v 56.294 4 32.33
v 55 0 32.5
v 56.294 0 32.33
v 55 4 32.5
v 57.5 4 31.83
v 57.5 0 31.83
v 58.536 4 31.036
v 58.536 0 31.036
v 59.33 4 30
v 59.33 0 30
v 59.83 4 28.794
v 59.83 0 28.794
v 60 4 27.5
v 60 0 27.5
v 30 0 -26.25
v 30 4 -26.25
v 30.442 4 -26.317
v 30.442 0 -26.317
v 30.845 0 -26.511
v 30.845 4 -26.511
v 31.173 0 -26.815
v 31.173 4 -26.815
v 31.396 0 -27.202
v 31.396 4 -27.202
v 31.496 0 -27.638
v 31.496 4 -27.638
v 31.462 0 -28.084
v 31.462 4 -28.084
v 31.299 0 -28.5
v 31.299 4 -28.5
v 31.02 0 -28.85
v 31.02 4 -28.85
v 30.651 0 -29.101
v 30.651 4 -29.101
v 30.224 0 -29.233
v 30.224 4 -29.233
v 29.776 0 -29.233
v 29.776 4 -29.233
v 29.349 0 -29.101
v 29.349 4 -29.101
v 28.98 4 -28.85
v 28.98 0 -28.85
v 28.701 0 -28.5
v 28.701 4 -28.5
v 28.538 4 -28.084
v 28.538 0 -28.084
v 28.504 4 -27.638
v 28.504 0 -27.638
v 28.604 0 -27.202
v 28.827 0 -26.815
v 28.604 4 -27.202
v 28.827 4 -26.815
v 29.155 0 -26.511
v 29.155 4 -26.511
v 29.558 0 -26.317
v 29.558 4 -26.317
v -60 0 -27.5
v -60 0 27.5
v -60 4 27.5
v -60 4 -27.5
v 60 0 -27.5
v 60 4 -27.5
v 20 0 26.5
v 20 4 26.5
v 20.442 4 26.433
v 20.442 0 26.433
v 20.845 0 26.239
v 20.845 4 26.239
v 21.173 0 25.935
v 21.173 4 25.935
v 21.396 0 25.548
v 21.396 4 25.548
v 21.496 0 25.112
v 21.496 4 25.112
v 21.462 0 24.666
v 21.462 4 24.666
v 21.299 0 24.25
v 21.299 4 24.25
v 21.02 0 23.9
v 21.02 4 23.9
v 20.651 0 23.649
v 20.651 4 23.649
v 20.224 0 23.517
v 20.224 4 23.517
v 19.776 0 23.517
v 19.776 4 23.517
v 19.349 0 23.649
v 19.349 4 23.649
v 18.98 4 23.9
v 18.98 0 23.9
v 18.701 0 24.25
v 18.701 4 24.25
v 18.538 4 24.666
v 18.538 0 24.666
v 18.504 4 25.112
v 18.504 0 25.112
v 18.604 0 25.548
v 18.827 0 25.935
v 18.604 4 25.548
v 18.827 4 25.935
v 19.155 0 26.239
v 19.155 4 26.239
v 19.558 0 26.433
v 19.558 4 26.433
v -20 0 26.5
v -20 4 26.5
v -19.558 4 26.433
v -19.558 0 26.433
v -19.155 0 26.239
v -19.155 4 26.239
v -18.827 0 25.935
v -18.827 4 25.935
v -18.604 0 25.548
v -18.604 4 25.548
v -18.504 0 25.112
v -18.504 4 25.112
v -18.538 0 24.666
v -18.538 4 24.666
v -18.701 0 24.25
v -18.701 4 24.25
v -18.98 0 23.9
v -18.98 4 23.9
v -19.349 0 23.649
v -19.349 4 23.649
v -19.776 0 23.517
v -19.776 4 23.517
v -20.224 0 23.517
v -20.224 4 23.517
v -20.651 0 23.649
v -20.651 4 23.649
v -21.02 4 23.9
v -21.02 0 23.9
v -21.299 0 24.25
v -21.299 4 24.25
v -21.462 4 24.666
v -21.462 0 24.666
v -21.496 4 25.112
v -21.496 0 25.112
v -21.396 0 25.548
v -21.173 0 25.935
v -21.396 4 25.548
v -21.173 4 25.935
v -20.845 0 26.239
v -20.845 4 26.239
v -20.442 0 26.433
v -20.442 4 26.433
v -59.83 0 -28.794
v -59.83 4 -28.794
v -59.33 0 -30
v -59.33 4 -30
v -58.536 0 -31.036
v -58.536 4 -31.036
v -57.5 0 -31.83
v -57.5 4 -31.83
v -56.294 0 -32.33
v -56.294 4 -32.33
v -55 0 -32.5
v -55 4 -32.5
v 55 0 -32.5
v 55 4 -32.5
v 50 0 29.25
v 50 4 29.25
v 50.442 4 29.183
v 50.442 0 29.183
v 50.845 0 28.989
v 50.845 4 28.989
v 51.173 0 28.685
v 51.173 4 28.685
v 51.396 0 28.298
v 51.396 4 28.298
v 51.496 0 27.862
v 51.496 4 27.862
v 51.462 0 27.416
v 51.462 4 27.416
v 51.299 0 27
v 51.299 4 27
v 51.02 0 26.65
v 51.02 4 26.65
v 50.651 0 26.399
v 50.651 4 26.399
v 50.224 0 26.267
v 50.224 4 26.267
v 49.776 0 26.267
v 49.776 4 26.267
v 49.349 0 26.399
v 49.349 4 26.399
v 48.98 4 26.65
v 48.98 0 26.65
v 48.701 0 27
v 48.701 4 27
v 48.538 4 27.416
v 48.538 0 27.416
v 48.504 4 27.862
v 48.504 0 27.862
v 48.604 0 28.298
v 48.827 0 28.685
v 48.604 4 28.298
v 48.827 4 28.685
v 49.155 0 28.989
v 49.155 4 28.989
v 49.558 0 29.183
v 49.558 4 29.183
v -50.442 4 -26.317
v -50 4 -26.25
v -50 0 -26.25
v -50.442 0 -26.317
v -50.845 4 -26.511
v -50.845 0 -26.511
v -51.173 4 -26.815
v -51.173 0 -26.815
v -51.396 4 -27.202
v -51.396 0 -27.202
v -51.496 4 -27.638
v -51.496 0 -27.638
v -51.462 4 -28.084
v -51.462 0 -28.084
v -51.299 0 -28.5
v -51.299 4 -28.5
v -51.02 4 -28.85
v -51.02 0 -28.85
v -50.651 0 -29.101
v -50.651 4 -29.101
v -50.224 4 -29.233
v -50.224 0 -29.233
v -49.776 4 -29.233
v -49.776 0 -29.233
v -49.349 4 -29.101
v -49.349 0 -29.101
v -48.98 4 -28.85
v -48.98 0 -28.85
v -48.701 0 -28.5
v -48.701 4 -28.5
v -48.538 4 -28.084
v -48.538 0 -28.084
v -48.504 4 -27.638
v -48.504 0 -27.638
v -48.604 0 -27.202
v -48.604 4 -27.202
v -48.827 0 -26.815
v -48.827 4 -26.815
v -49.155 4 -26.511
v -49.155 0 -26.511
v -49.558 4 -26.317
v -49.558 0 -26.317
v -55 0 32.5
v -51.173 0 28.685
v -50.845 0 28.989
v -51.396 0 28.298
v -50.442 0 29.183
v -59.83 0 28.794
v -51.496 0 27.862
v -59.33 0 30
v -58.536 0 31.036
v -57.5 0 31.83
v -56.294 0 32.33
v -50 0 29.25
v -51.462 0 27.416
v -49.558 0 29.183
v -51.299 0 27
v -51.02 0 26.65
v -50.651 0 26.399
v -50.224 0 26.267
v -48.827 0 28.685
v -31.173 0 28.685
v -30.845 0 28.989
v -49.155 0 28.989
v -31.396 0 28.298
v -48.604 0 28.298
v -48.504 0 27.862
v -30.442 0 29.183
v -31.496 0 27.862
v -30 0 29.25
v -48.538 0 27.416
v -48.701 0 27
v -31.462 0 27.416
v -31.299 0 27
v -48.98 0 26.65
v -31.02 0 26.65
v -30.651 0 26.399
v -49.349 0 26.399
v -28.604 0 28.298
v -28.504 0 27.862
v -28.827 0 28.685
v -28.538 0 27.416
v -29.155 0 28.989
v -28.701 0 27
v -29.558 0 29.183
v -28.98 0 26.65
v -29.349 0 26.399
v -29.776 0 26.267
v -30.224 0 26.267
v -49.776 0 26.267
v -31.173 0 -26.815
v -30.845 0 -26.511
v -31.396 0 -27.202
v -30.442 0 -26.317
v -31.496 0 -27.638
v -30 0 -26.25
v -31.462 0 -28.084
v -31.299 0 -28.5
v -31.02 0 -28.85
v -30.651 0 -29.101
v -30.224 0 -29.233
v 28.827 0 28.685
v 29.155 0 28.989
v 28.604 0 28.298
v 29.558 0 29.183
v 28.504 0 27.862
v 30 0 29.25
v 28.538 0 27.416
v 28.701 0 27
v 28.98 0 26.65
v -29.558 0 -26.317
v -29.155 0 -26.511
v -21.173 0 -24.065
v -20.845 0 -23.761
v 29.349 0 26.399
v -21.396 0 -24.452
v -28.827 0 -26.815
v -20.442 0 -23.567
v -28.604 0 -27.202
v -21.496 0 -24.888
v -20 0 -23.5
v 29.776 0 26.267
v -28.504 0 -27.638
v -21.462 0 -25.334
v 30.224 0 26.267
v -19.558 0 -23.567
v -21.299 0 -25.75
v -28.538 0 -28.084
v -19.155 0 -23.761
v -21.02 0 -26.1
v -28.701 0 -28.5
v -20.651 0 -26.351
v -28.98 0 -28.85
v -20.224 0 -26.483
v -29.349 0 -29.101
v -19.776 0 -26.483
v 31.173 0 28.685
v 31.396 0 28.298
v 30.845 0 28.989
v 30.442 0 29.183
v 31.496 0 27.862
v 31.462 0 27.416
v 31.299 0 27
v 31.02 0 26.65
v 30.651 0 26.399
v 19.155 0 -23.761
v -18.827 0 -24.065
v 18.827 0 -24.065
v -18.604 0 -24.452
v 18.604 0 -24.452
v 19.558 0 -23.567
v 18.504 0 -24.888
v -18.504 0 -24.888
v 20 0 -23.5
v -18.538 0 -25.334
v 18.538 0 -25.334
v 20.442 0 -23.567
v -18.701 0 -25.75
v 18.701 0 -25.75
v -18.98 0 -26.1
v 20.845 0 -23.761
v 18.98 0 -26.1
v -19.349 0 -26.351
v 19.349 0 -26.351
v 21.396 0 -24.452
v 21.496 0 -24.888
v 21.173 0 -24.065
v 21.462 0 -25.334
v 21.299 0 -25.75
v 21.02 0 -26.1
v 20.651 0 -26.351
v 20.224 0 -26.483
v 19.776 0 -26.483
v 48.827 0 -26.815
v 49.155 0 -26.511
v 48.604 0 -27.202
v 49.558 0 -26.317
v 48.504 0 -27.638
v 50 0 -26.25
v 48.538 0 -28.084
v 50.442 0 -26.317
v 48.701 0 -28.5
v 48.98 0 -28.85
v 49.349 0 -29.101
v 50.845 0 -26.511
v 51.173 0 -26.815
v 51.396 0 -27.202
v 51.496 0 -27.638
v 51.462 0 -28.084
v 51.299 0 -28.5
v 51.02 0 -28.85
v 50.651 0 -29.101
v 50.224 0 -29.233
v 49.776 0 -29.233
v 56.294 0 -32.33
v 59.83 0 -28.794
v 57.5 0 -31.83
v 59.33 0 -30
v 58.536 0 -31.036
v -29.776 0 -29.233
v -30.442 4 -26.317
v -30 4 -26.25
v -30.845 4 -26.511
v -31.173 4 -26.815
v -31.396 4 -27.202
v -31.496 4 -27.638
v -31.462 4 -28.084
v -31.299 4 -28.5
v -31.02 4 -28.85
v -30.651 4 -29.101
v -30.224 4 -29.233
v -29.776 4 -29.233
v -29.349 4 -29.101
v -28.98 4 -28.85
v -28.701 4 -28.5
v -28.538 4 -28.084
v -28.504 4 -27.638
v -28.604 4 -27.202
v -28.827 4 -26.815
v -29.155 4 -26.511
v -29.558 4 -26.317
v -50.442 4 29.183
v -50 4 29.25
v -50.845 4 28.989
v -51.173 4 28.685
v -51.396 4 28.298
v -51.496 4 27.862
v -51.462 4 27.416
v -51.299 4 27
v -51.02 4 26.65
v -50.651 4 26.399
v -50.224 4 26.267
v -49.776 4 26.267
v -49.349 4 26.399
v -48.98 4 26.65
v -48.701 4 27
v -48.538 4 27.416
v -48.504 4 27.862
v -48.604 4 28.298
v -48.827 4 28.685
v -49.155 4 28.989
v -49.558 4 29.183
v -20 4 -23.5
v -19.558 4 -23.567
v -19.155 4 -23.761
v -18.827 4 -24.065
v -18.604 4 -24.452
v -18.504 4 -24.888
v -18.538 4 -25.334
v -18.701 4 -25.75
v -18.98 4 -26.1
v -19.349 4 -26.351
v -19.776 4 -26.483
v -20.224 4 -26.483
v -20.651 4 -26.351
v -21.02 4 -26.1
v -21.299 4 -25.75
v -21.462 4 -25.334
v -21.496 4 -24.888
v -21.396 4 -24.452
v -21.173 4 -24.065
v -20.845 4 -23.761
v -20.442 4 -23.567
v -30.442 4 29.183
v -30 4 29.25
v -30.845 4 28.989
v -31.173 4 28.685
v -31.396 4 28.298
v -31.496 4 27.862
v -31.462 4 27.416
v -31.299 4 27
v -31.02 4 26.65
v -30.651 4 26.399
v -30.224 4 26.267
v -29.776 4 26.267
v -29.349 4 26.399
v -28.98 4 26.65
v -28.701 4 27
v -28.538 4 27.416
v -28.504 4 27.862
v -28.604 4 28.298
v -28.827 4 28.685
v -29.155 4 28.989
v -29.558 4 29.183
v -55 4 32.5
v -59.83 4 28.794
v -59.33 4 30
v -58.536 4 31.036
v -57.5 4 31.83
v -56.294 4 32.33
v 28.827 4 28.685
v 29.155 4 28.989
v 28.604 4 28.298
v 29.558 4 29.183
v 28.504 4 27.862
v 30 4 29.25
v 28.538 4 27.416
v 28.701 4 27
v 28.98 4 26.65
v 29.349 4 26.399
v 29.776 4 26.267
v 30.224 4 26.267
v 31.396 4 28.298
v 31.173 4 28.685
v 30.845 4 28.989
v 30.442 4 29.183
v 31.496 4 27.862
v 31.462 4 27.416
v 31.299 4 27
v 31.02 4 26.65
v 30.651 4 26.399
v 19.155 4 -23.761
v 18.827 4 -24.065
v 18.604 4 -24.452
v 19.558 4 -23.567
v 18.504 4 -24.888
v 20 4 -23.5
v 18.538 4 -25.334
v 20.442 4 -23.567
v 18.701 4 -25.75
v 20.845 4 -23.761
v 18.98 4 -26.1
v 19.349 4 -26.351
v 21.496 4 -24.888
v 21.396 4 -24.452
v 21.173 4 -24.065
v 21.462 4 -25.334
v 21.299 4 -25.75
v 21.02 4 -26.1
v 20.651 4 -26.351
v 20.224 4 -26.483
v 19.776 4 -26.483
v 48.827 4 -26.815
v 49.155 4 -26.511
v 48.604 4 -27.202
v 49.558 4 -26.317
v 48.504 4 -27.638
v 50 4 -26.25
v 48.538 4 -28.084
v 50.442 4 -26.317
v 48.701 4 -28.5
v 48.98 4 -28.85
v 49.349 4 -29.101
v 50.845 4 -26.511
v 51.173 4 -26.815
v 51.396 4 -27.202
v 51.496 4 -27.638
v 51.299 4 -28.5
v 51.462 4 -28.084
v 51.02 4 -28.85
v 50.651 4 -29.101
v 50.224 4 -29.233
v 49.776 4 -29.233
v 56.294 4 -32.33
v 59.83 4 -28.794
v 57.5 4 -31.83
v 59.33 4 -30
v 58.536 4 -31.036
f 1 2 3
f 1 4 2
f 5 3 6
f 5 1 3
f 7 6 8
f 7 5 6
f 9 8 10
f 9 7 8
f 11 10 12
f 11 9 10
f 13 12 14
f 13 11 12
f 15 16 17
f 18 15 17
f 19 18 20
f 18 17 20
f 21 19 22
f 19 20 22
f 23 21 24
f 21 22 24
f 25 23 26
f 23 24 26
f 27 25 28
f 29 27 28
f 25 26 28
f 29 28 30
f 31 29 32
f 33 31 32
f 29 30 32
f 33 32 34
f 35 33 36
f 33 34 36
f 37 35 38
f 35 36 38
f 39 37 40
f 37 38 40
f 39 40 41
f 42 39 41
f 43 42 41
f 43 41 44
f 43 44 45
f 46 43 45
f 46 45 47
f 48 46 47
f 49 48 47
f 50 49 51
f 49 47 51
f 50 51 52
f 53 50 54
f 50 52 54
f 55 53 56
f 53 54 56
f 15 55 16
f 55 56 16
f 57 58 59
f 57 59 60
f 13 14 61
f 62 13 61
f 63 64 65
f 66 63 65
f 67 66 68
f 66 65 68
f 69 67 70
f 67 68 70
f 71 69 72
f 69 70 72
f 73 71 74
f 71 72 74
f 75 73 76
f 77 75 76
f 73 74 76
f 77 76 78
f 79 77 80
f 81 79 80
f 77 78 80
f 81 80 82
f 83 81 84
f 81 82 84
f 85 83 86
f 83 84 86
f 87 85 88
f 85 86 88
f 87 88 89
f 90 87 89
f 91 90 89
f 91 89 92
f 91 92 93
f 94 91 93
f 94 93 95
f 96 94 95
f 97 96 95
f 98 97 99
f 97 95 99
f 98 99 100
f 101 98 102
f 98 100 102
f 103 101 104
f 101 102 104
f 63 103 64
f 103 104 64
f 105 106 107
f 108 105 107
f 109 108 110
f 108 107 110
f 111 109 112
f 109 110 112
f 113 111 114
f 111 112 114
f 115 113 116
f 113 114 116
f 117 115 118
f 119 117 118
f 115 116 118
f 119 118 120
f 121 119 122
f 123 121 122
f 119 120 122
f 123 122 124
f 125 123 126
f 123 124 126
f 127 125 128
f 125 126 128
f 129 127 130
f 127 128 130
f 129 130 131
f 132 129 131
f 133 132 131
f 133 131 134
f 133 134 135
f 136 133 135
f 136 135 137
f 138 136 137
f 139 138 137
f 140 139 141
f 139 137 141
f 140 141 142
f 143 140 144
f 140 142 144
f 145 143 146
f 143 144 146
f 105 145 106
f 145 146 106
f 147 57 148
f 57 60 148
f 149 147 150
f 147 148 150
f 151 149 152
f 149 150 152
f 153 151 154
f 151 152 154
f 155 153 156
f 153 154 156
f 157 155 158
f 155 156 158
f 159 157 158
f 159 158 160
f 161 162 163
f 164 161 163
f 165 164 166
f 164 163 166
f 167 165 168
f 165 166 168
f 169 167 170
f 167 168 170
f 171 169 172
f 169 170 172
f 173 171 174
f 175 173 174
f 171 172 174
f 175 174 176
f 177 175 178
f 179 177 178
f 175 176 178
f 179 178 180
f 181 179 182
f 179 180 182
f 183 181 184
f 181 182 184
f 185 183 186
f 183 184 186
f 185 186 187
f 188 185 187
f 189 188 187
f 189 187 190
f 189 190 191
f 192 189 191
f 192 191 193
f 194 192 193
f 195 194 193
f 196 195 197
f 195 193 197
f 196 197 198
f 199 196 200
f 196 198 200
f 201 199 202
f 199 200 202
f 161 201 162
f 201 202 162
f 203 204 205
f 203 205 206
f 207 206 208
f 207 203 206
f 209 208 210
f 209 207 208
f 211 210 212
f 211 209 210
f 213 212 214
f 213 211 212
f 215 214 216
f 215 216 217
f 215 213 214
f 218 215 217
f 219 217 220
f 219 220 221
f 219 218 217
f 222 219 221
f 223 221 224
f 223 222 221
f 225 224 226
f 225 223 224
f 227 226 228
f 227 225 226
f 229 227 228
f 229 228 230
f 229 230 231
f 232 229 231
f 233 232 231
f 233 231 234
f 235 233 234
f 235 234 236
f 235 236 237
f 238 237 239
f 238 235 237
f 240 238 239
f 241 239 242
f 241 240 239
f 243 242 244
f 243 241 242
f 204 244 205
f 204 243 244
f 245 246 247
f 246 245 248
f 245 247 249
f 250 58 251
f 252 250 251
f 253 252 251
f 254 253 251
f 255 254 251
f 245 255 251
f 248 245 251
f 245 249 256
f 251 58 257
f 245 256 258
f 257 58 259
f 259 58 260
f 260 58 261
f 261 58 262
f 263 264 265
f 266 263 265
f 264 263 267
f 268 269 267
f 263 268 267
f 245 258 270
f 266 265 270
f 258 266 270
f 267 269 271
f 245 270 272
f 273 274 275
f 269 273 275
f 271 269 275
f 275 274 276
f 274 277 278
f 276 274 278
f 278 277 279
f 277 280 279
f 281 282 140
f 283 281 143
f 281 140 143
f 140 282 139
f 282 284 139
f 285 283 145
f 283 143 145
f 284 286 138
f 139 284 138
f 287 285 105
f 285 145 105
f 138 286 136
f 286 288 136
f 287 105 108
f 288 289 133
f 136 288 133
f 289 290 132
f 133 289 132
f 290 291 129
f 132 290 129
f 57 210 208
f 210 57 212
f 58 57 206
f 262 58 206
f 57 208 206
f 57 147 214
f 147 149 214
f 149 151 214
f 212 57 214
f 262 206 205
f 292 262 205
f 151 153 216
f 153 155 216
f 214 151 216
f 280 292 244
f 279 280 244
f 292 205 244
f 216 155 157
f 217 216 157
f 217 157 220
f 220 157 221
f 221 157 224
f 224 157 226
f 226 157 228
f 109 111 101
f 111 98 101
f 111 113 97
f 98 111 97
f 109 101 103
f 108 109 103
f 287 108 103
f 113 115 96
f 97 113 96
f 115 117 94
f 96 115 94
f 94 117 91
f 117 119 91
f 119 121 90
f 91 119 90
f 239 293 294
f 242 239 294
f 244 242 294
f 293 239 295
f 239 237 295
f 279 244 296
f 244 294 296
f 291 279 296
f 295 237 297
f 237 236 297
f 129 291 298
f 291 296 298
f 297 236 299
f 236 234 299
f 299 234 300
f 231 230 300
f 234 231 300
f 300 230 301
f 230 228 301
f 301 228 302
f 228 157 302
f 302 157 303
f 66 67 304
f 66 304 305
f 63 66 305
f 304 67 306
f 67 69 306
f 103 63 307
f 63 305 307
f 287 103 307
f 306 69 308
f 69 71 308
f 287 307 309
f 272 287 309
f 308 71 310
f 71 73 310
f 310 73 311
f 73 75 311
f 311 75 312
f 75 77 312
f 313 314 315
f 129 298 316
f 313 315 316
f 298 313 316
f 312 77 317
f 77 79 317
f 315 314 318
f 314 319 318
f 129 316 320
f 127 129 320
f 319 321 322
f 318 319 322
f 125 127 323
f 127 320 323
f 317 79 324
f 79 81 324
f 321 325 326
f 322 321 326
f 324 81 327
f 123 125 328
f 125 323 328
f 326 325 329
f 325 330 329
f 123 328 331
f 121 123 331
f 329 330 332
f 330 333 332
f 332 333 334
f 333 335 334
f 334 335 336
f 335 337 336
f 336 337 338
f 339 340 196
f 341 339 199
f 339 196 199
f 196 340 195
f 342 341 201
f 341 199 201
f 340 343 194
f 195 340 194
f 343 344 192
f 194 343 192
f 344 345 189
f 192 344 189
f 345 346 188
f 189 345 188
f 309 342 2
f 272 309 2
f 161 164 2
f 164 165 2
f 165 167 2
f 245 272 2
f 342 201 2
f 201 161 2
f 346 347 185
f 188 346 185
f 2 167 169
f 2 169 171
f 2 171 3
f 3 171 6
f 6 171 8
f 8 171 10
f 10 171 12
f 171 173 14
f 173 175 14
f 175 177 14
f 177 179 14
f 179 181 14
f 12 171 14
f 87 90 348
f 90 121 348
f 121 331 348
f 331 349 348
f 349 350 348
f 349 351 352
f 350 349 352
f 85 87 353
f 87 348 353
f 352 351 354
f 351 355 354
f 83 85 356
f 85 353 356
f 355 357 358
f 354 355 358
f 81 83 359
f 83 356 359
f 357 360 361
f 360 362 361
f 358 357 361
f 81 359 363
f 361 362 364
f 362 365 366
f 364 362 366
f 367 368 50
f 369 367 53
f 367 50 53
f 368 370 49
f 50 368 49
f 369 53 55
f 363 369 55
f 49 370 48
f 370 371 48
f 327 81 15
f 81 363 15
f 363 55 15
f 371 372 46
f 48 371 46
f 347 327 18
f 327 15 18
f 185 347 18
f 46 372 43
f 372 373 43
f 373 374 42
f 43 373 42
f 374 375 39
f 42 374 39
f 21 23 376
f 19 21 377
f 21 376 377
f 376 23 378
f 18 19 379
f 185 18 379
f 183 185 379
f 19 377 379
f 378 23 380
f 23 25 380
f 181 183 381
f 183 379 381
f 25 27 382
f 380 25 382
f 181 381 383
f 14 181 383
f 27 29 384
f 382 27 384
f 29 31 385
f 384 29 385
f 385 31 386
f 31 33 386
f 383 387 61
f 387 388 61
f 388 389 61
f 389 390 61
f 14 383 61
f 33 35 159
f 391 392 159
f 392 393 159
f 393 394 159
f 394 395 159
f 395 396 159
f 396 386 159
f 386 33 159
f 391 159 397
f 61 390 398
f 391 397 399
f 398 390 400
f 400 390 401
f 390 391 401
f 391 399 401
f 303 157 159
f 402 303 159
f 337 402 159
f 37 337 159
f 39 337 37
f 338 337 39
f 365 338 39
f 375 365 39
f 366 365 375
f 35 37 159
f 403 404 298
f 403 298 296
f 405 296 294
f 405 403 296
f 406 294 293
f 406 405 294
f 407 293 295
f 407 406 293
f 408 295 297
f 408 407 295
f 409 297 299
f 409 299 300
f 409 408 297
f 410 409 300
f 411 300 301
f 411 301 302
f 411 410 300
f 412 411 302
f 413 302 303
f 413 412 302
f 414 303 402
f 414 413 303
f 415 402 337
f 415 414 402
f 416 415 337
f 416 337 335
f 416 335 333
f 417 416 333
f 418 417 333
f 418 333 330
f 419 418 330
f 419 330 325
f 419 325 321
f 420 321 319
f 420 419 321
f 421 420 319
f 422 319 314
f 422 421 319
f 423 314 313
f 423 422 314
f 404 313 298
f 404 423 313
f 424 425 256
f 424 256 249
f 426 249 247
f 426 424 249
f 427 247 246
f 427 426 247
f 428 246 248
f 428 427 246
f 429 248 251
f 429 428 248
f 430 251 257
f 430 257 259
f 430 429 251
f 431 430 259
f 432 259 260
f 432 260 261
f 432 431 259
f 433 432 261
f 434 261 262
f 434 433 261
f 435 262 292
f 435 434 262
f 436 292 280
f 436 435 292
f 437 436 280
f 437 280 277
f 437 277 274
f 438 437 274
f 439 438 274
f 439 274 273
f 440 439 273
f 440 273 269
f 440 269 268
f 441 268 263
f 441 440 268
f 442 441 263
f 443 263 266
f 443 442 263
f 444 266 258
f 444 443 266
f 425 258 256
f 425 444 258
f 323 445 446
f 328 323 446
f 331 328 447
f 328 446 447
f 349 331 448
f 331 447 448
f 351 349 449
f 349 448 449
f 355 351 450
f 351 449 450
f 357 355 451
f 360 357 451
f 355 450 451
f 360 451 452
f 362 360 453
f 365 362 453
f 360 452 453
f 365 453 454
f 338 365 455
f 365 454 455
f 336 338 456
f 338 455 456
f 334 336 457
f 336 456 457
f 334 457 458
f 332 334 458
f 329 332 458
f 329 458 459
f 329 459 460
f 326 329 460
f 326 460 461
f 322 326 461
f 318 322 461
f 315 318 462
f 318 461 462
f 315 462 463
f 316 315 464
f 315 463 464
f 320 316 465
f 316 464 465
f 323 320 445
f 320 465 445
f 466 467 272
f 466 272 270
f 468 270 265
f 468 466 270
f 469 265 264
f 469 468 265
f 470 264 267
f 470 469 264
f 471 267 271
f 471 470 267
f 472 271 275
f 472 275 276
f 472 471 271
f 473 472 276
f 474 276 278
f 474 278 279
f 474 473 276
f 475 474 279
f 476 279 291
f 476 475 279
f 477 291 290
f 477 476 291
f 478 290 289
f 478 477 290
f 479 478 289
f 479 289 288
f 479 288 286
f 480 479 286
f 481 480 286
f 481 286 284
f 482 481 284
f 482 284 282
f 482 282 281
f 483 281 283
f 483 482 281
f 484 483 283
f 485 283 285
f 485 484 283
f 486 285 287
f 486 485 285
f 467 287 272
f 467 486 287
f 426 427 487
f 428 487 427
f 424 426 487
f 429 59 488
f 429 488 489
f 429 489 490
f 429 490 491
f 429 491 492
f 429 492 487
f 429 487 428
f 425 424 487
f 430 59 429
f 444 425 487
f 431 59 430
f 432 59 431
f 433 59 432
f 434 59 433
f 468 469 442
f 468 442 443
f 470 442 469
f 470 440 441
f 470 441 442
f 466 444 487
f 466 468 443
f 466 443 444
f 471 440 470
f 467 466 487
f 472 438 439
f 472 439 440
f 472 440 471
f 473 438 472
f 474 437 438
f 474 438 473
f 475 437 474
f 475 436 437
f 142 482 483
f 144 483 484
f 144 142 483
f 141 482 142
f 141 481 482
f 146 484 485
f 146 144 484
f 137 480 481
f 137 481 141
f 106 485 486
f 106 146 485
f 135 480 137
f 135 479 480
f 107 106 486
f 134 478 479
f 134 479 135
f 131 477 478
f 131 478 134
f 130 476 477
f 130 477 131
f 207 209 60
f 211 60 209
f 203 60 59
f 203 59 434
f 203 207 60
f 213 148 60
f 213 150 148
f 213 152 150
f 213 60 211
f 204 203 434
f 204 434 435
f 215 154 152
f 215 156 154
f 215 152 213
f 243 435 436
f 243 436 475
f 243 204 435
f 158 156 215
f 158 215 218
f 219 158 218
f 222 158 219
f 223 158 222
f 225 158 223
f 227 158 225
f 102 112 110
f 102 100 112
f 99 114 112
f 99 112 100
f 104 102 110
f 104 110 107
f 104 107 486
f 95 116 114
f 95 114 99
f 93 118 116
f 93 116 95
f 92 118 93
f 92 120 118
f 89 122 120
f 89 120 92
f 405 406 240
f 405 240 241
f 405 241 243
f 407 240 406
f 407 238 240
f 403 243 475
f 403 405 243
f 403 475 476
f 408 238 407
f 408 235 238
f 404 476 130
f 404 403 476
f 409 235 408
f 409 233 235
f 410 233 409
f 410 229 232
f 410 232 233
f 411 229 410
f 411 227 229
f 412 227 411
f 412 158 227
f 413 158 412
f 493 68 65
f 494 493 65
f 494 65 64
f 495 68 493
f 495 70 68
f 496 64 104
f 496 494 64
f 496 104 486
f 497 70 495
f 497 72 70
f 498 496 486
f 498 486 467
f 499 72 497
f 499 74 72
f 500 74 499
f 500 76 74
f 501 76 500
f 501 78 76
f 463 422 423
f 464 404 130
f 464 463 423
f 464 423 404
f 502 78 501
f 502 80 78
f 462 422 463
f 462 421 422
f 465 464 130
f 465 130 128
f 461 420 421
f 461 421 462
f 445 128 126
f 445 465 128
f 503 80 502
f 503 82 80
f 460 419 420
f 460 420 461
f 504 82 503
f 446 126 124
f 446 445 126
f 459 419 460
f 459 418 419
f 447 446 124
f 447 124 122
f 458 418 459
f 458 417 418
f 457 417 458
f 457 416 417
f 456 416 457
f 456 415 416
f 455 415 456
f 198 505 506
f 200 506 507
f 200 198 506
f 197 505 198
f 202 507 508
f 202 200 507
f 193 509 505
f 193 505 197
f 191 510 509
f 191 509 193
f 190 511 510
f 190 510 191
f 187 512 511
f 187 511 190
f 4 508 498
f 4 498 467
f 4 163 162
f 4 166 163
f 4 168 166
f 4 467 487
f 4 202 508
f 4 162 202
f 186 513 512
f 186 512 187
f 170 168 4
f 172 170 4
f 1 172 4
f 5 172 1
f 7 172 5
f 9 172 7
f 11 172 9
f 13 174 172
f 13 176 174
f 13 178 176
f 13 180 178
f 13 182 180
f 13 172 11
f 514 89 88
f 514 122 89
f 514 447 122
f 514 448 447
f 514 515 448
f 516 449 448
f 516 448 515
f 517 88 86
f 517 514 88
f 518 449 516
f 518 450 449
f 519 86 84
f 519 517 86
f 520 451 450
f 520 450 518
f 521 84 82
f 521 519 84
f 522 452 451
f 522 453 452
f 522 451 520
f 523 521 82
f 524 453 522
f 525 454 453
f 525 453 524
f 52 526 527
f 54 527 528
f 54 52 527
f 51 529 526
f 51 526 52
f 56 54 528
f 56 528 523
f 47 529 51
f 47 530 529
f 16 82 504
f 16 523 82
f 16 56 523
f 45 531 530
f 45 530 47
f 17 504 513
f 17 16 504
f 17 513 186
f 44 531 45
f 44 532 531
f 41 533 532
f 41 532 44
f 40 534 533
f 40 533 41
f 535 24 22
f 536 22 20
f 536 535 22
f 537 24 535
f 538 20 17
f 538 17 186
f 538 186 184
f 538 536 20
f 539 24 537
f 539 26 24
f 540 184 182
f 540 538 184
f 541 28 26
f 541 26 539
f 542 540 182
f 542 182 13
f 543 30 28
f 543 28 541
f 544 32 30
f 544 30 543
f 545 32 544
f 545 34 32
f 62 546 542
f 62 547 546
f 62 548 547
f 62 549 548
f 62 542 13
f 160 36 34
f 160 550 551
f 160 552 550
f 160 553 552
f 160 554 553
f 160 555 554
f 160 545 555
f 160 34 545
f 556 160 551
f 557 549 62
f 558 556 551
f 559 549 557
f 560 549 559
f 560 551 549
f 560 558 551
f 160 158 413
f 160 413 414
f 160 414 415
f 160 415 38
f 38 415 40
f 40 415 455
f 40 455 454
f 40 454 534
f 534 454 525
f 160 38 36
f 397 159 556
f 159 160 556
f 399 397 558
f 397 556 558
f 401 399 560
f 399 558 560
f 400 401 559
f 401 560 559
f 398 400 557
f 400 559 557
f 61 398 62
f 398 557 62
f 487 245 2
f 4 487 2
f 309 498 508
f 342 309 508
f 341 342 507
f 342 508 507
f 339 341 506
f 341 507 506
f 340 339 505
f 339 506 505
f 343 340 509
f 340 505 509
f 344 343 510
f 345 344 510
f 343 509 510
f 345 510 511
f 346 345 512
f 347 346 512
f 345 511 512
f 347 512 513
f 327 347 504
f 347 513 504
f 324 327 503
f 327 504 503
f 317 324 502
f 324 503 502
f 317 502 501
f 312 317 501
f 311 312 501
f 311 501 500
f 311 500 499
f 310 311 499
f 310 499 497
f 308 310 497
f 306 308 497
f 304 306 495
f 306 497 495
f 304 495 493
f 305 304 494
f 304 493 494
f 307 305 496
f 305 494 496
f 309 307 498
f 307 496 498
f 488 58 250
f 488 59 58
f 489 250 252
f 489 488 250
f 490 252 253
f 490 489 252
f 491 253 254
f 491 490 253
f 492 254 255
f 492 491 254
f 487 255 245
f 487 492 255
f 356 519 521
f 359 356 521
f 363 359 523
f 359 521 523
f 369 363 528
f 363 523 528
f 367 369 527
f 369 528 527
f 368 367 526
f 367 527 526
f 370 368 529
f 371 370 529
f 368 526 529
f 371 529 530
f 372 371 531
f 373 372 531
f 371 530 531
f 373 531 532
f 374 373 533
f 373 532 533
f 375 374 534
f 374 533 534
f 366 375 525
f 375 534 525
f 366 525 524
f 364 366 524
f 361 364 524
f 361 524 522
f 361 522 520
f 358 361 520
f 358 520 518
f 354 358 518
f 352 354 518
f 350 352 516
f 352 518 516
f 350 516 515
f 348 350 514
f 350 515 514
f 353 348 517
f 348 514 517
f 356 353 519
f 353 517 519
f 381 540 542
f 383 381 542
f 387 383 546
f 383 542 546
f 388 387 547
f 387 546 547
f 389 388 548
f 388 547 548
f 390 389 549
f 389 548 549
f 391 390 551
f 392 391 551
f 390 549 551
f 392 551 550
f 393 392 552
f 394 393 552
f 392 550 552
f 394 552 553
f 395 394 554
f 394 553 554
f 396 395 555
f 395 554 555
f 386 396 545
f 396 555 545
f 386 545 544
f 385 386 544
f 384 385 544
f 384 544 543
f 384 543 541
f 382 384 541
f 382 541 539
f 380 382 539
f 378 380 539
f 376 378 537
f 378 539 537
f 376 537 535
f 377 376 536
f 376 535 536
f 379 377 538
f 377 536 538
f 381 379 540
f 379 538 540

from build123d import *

# Parameters (mm, degrees)
SKETCH_1_W          = 120
SKETCH_1_H          = 65
EXTRUDE_1_DEPTH     = 4
SKETCH_2_R          = 1.5
CUT_EXTRUDE_1_DEPTH = 4
FILLET_1_R          = 5
SKETCH_3_R          = 1.5
CUT_EXTRUDE_2_DEPTH = 4


with BuildPart() as part:
    # 草图1 → 凸台-拉伸1 (new body)
    with BuildSketch(Plane(origin=(0, 0, 0), x_dir=(1, 0, 0), z_dir=(0, 1, 0))):
        Rectangle(SKETCH_1_W, SKETCH_1_H)
    extrude(amount=EXTRUDE_1_DEPTH)

    # 草图2 → 切除-拉伸1 (cut)
    with BuildSketch(Plane(origin=(0, 4, 0), x_dir=(1, 0, 0), z_dir=(0, 1, 0))):
        with Locations(Location((50, -27.75, 0), (0, 0, 270))):
            Circle(SKETCH_2_R)
        with Locations(Location((50, 27.75, 0), (0, 0, 270))):
            Circle(SKETCH_2_R)
        with Locations(Location((30, 27.75, 0), (0, 0, 270))):
            Circle(SKETCH_2_R)
        with Locations(Location((30, -27.75, 0), (0, 0, 270))):
            Circle(SKETCH_2_R)
    cut_extrude_1 = extrude(amount=-CUT_EXTRUDE_1_DEPTH, mode=Mode.SUBTRACT)

    # 镜向2: 切除-拉伸1 across plane
    add(cut_extrude_1.mirror(Plane(origin=(0, 0, 0), x_dir=(0, 0, 1), z_dir=(1, 0, 0))), mode=Mode.SUBTRACT)

    # 圆角1
    fillet_1_edges = [part.edges().sort_by_distance(p)[0] for p in [
        (60, 2, 32.5),
        (-60, 2, 32.5),
        (-60, 2, -32.5),
        (60, 2, -32.5),
    ]]
    fillet(fillet_1_edges, radius=FILLET_1_R)

    # 草图3 → 切除-拉伸2 (cut)
    with BuildSketch(Plane(origin=(0, 4, 0), x_dir=(1, 0, 0), z_dir=(0, 1, 0))):
        with Locations(Location((-20, 25, 0), (0, 0, 270))):
            Circle(SKETCH_3_R)
        with Locations(Location((20, 25, 0), (0, 0, 270))):
            Circle(SKETCH_3_R)
        with Locations(Location((20, -25, 0), (0, 0, 270))):
            Circle(SKETCH_3_R)
        with Locations(Location((-20, -25, 0), (0, 0, 270))):
            Circle(SKETCH_3_R)
    extrude(amount=-CUT_EXTRUDE_2_DEPTH, mode=Mode.SUBTRACT)


solid = part.part
